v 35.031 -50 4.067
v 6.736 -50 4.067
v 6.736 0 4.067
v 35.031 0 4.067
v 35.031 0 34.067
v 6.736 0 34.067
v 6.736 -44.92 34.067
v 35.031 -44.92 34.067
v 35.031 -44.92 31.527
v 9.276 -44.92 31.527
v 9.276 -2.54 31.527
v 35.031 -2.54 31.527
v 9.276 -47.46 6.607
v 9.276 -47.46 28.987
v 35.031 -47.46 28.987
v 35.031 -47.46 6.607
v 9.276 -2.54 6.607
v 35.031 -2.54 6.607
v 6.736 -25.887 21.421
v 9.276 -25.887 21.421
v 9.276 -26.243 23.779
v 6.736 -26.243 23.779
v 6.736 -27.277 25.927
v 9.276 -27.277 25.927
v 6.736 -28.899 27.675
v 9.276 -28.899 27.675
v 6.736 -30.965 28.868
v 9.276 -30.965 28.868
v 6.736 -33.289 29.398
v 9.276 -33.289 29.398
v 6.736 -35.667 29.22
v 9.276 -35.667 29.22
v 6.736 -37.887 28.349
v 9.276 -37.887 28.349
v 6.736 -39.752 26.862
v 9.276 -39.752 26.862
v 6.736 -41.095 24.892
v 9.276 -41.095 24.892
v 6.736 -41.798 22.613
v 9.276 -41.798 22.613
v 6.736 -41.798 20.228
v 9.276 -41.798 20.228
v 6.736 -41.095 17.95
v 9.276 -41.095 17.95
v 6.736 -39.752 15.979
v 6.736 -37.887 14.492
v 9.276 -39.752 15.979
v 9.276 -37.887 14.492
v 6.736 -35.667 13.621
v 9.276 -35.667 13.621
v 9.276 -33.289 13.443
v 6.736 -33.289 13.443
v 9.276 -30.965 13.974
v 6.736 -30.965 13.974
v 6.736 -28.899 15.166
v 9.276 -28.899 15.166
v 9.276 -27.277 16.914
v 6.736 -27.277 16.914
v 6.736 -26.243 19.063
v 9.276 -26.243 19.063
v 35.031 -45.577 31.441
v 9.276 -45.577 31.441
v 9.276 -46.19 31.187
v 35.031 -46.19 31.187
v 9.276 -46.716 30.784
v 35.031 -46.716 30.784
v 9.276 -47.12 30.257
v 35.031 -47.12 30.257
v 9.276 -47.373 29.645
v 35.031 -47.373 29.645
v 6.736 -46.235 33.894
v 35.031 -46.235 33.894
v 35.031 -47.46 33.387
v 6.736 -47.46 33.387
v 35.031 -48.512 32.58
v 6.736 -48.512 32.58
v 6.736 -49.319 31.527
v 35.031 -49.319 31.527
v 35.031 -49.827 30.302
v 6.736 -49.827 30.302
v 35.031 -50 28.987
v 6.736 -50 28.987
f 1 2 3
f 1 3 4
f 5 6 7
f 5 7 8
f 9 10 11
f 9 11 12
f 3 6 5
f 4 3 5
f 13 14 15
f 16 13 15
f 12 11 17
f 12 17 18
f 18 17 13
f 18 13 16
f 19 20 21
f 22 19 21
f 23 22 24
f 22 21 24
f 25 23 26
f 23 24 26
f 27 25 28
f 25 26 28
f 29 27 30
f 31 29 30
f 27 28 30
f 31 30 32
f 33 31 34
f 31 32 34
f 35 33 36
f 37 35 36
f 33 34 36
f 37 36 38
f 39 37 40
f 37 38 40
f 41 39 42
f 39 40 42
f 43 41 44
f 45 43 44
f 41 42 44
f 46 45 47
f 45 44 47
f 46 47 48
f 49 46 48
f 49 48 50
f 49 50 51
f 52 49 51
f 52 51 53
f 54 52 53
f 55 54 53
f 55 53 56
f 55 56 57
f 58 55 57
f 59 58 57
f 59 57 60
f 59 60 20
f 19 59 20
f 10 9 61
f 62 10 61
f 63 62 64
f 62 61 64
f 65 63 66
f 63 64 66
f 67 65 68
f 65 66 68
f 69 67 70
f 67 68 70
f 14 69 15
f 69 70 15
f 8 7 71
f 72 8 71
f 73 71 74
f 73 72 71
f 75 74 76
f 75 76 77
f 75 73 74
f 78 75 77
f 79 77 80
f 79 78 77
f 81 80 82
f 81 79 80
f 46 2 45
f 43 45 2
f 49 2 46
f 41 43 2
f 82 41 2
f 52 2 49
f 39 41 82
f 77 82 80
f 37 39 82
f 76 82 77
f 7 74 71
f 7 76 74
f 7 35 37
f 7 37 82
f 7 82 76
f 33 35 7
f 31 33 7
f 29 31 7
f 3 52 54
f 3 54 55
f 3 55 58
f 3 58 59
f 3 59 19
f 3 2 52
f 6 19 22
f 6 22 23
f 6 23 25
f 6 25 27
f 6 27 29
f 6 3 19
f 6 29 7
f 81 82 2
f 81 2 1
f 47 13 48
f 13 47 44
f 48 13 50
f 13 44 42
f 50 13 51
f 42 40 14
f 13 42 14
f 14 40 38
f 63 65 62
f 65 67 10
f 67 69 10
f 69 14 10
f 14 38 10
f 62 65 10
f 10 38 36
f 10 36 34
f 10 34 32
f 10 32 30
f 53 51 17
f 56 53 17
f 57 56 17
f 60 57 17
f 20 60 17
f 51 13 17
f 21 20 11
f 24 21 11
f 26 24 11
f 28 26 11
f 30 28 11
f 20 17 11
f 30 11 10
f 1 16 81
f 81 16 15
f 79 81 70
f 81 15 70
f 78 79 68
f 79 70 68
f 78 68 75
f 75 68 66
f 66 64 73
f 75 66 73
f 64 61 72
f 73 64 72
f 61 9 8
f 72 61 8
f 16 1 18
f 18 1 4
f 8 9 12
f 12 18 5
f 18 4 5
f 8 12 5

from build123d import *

# Parameters (mm, degrees)
F0_W     = 28.295456
F0_H     = 30
F1_DEPTH = 50
F2_R     = 5.08
F3_T     = -2.54
F4_R     = 8
F5_DEPTH = 9.1


with BuildPart() as f1:
    # F0 (on Front) → F1 (new body)
    with BuildSketch(Plane.XZ):
        with Locations((20.883416, 19.067463)):
            Rectangle(F0_W, F0_H)
    extrude(amount=F1_DEPTH)

    # F2
    f2_edges = [f1.edges().sort_by_distance(p)[0] for p in [
        (20.883416, -50, 34.067463),
    ]]
    fillet(f2_edges, radius=F2_R)

    # F3
    f3_openings = [f1.faces().sort_by_distance(p)[0] for p in [
        (35.031144, -24.911561, 19.016082),
    ]]
    offset(amount=F3_T, openings=f3_openings)

    # F4 (on face) → F5 (cut)
    with BuildSketch(Plane.YZ.offset(9.275688)):
        with Locations((-33.887234, 21.420674)):
            Circle(F4_R)
    extrude(amount=-F5_DEPTH, mode=Mode.SUBTRACT)


solid = f1.part
